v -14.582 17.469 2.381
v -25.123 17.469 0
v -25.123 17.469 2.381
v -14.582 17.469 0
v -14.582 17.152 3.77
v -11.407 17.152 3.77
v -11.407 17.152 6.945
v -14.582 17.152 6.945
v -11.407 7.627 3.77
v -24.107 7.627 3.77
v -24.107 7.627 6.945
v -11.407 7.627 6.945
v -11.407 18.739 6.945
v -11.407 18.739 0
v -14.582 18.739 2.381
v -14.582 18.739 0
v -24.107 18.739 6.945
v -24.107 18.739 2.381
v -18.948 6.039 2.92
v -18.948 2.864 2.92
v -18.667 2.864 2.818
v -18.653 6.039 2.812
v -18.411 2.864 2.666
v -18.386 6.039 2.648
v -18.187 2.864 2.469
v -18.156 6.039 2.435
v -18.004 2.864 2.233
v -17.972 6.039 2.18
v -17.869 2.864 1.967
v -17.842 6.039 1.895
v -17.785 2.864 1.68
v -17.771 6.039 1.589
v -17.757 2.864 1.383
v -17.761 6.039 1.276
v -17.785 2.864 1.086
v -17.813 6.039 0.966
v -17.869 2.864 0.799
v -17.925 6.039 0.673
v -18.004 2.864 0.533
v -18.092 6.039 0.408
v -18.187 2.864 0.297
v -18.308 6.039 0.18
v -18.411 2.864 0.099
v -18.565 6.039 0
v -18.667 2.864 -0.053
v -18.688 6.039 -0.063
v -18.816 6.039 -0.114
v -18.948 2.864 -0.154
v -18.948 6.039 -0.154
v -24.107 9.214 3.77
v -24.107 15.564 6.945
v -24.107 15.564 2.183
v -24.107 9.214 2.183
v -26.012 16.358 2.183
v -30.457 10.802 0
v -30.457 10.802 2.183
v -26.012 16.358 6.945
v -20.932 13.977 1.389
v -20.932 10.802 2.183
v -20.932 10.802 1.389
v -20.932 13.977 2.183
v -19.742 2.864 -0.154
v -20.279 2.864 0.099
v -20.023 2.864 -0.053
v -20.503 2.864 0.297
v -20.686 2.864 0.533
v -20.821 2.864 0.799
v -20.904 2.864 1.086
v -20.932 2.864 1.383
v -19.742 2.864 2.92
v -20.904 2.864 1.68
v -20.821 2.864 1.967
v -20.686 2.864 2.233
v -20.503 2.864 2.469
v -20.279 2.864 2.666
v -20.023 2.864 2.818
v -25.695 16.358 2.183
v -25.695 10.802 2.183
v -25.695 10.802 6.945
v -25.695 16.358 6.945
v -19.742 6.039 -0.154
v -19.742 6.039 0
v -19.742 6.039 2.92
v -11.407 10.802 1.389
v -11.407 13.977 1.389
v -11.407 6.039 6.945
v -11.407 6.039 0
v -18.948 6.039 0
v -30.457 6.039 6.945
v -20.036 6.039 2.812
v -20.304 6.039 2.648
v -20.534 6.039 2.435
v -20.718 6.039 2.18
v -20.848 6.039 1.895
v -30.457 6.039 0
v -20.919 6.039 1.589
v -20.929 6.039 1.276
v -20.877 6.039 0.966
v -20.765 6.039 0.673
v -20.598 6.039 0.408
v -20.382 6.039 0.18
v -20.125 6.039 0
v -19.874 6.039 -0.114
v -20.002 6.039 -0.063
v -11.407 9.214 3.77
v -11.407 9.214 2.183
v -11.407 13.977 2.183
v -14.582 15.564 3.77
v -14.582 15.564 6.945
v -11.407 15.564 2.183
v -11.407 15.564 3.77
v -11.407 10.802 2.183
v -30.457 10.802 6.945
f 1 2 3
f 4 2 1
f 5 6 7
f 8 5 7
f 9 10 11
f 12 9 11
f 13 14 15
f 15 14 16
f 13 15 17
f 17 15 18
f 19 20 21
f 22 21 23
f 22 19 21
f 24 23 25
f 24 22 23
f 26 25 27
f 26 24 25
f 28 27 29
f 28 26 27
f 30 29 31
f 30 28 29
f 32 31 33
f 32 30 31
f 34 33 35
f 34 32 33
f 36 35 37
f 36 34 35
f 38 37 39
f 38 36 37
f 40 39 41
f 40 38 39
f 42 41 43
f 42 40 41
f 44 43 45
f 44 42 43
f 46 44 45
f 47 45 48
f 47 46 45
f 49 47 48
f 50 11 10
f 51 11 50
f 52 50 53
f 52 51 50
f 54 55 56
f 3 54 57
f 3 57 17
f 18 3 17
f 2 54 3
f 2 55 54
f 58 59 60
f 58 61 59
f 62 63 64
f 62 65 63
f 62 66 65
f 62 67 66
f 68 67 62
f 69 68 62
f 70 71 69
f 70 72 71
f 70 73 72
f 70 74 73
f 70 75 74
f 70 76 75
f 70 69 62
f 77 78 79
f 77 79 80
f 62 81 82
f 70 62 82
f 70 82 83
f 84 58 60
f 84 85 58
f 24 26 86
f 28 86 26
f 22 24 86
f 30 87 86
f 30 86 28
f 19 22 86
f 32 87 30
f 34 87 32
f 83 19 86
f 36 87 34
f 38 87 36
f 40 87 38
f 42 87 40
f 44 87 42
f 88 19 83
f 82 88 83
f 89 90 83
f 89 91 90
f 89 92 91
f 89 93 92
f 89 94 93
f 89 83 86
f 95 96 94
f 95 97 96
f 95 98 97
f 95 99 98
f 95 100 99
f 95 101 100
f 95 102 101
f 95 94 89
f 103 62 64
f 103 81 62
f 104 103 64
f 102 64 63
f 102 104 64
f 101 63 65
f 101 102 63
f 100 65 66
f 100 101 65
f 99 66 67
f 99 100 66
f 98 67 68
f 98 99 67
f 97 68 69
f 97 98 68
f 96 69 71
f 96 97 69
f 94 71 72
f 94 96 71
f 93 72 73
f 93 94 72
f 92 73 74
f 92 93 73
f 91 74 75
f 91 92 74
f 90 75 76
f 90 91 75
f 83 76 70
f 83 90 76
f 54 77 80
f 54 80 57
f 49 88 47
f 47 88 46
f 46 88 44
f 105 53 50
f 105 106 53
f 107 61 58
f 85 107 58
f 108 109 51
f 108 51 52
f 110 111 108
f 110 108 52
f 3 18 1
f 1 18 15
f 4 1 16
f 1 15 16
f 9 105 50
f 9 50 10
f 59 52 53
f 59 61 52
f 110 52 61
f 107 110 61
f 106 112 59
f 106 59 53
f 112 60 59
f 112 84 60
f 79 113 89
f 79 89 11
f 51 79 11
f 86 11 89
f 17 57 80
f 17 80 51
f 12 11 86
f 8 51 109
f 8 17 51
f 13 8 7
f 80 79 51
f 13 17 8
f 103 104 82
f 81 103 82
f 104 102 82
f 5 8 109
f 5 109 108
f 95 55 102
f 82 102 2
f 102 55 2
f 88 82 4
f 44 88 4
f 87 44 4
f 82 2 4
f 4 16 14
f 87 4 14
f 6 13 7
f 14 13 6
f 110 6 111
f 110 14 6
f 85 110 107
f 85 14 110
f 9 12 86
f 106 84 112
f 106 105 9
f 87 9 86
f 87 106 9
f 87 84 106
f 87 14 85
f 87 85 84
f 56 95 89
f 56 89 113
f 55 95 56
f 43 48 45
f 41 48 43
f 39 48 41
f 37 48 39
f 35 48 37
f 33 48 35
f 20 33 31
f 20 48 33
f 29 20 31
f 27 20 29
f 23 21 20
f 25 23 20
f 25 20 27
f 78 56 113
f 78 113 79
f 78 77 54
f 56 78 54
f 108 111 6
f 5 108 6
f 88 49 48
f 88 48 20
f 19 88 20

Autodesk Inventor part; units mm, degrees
ref_plane "YZ Plane" through (0, 0, 0) normal (1, 0, 0) x (0, 1, 0)
sketch "Sketch1" plane through (0, 0, 0) normal (0, 0, 1) x (1, 0, 0)
  line L0 (-11.4074, 18.7393) -> (-11.4074, 6.0393)
  line L1 (-11.4074, 6.0393) -> (-30.4574, 6.0393)
  line L2 (-30.4574, 6.0393) -> (-30.4574, 10.8018)
  line L3 (-30.4574, 10.8018) -> (-24.1074, 18.7393)
  line L4 (-11.4074, 18.7393) -> (-24.1074, 18.7393)
  dimension "d0" = 12.7
  dimension "d1" = 19.05
  dimension "d2" = 4.7625
  dimension "d4" = 12.7
extrude "Extrusion1" add sketch "Sketch1" along normal blind 13.8906
sketch "Sketch3" plane through (-30.4574, 6.0393, 0) normal (-1, 0, 0) x (0, 0, 1)
  line L0 (13.8906, 0) -> (13.8906, 4.7625) projected
  line L1 (0, 4.7625) -> (13.8906, 4.7625) projected
  line L2 (0, 0) -> (0, 4.7625) projected
  line L3 (0, 0) -> (13.8906, 0) projected
  circle A0 centre (6.9453, 2.1164) radius 6.9453 construction
  line L4 (6.9453, 2.1164) -> (6.9453, 0)
ref_plane "Work Plane1" through (-30.4574, 8.1557, 6.9453) normal (0, 0, -1) x (-1, 0, 0)
sketch "Sketch4" plane through (-30.4574, 8.1557, 6.9453) normal (0, 0, -1) x (-1, 0, 0)
  line L0 (-4.7625, 8.2023) -> (0, 8.2023)
  line L1 (0, 8.2023) -> (0, 2.6461)
  line L2 (0, 2.6461) -> (-4.7625, 2.6461)
  line L3 (-4.7625, 2.6461) -> (-4.7625, 8.2023)
  line L4 (0, -2.1164) -> (0, 2.6461) projected
  dimension "d13" = 4.7625
  dimension "d14" = 5.5563
extrude "Extrusion3" cut sketch "Sketch4" against normal mid plane 9.525
sketch "Sketch5" plane through (-11.4074, 6.0393, 0) normal (1, 0, 0) x (0, 0, -1)
  line L0 (-13.8906, 12.7) -> (-13.8906, 0) projected
  line L1 (0, 0) -> (-13.8906, 0) projected
  line L2 (0, 12.7) -> (0, 0) projected
  line L3 (0, 12.7) -> (-13.8906, 12.7) projected
  line L4 (-11.7078, 9.525) -> (-2.1828, 9.525)
  line L5 (-2.1828, 9.525) -> (-2.1828, 3.175)
  line L6 (-2.1828, 3.175) -> (-11.7078, 3.175)
  line L7 (-11.7078, 3.175) -> (-11.7078, 9.525)
  circle A0 centre (-6.9453, 6.35) radius 4.7625 construction
  circle A1 centre (-6.9453, 6.35) radius 3.175 construction
  circle A2 centre (-6.9453, 6.35) radius 6.35 construction
  circle A3 centre (-6.9453, 6.35) radius 6.9453 construction
  dimension "d17" = 9.525
  dimension "d18" = 6.35
extrude "Extrusion4" cut sketch "Sketch5" against normal blind 12.7 contours L4 L5 L6 L7
sketch "Sketch6" plane through (-11.4074, 6.0393, 0) normal (1, 0, 0) x (0, 0, -1)
  line L0 (-11.7078, 3.175) -> (-11.7078, 9.525) projected
  line L1 (-11.7078, 9.525) -> (-2.1828, 9.525) projected
  line L2 (-2.1828, 9.525) -> (-2.1828, 3.175) projected
  line L3 (-10.1203, 9.525) -> (-3.7703, 9.525)
  line L4 (-3.7703, 9.525) -> (-3.7703, 11.1125)
  line L5 (-3.7703, 11.1125) -> (-10.1203, 11.1125)
  line L6 (-10.1203, 11.1125) -> (-10.1203, 9.525)
  circle A0 centre (-6.9453, 20.5431) radius 3.175 construction
  circle A1 centre (-6.9453, 20.5431) radius 4.7625 construction
  dimension "d21" = 6.35
  dimension "d22" = 1.5875
extrude "Extrusion5" cut sketch "Sketch6" against normal blind 3.175
sketch "Sketch7" plane through (-11.4074, 6.0393, 0) normal (1, 0, 0) x (0, 0, -1)
  line L0 (-13.8906, 12.7) -> (-13.8906, 0) projected
  line L1 (0, 0) -> (-13.8906, 0) projected
  line L2 (0, 12.7) -> (0, 0) projected
  line L3 (0, 12.7) -> (-13.8906, 12.7) projected
  line L4 (-12.5016, 7.9375) -> (-1.3891, 7.9375)
  line L5 (-1.3891, 7.9375) -> (-1.3891, 4.7625)
  line L6 (-1.3891, 4.7625) -> (-12.5016, 4.7625)
  line L7 (-12.5016, 4.7625) -> (-12.5016, 7.9375)
  circle A0 centre (-6.9453, 6.35) radius 5.5563 construction
  circle A1 centre (-6.9453, 6.35) radius 6.9453 construction
  circle A2 centre (-6.9453, 6.35) radius 6.35 construction
  circle A3 centre (-6.9453, 6.35) radius 1.5875 construction
  dimension "d25" = 3.175
  dimension "d26" = 11.1125
extrude "Extrusion6" cut sketch "Sketch7" against normal blind 9.525 contours L4 L5 L6 L7
sketch "Sketch8" plane through (-11.4074, 6.0393, 0) normal (1, 0, 0) x (0, 0, -1)
  line L0 (-10.1203, 9.525) -> (-10.1203, 11.1125) projected
  line L1 (-3.7703, 11.1125) -> (-3.7703, 9.525) projected
  line L2 (-2.1828, 3.175) -> (-11.7078, 3.175) projected
  line L3 (-10.1203, 3.175) -> (-3.7703, 3.175)
  line L4 (-3.7703, 3.175) -> (-3.7703, 1.5875)
  line L5 (-3.7703, 1.5875) -> (-10.1203, 1.5875)
  line L6 (-10.1203, 1.5875) -> (-10.1203, 3.175)
  dimension "d29" = 1.5875
extrude "Extrusion7" cut sketch "Sketch8" against normal up to surface (12.7 mm away)
sketch "Sketch9" plane through (-30.4574, 6.0393, 0) normal (0, -1, 0) x (1, 0, 0)
  line L0 (19.05, 13.8906) -> (0, 13.8906) projected
  line L1 (19.05, 0) -> (0, 0) projected
  line L2 (19.05, 0) -> (19.05, 13.8906) projected
  line L3 (11.5094, -0.1544) -> (11.5094, 2.9198)
  line L4 (11.5094, 10.9708) -> (11.5094, 14.045)
  line L5 (10.7156, -0.1544) -> (10.7156, 2.9198)
  line L6 (10.7156, 10.9708) -> (10.7156, 14.045)
  arc A0 (10.7156, 2.9198) -> (10.7156, -0.1544) centre (11.1125, 1.3827) ccw
  arc A1 (11.5094, -0.1544) -> (11.5094, 2.9198) centre (11.1125, 1.3827) ccw
  arc A2 (11.5094, 10.9708) -> (11.5094, 14.045) centre (11.1125, 12.5079) ccw
  arc A3 (10.7156, 14.045) -> (10.7156, 10.9708) centre (11.1125, 12.5079) ccw
  circle A4 centre (11.1125, 6.9453) radius 5.5626 construction
  circle A5 centre (11.1125, 6.9453) radius 6.9453 construction
  dimension "d32" = 7.9375
  dimension "d33" = 1.5875
  dimension "d34" = 0.7937
  dimension "d35" = 0.3969
  dimension "d45" = 11.1252
extrude "Extrusion8" add sketch "Sketch9" along normal blind 3.175
sketch "Sketch10" plane through (-24.1074, 18.7393, 0) normal (0, 1, 0) x (1, 0, 0)
  line L0 (0, -13.8906) -> (12.7, -13.8906) projected
  line L1 (12.7, 0) -> (12.7, -13.8906) projected
  line L2 (0, 0) -> (12.7, 0) projected
  line L3 (9.525, 0) -> (-3.175, 0)
  line L4 (-3.175, 0) -> (-3.175, -2.3813)
  line L5 (-3.175, -2.3813) -> (9.525, -2.3812)
  line L6 (9.525, -2.3812) -> (9.525, 0)
  line L7 (9.525, -11.5094) -> (-3.175, -11.5094)
  line L8 (-3.175, -11.5094) -> (-3.175, -13.8906)
  line L9 (-3.175, -13.8906) -> (9.525, -13.8906)
  line L10 (9.525, -13.8906) -> (9.525, -11.5094)
  dimension "d38" = 3.175
  dimension "d39" = 2.3813
  dimension "d40" = 2.3813
  dimension "d41" = 12.7
  dimension "d42" = 12.7
extrude "Extrusion9" cut sketch "Sketch10" against normal blind 1.27
ref_plane "Work Plane2" through (0, 0, 6.9453) normal (0, 0, 1) x (1, 0, 0)
sketch "Sketch12" plane through (0, 0, 6.9453) normal (0, 0, 1) x (1, 0, 0)
  line L0 (-34.925, 19.05) -> (-7.9375, 19.05)
  line L1 (-7.9375, 19.05) -> (-7.9375, -1.5875)
  line L2 (-7.9375, -1.5875) -> (-34.925, -1.5875)
  line L3 (-34.925, -1.5875) -> (-34.925, 19.05)
extrude "Extrusion10" cut sketch "Sketch12" along normal through all
properties part number "connect"
